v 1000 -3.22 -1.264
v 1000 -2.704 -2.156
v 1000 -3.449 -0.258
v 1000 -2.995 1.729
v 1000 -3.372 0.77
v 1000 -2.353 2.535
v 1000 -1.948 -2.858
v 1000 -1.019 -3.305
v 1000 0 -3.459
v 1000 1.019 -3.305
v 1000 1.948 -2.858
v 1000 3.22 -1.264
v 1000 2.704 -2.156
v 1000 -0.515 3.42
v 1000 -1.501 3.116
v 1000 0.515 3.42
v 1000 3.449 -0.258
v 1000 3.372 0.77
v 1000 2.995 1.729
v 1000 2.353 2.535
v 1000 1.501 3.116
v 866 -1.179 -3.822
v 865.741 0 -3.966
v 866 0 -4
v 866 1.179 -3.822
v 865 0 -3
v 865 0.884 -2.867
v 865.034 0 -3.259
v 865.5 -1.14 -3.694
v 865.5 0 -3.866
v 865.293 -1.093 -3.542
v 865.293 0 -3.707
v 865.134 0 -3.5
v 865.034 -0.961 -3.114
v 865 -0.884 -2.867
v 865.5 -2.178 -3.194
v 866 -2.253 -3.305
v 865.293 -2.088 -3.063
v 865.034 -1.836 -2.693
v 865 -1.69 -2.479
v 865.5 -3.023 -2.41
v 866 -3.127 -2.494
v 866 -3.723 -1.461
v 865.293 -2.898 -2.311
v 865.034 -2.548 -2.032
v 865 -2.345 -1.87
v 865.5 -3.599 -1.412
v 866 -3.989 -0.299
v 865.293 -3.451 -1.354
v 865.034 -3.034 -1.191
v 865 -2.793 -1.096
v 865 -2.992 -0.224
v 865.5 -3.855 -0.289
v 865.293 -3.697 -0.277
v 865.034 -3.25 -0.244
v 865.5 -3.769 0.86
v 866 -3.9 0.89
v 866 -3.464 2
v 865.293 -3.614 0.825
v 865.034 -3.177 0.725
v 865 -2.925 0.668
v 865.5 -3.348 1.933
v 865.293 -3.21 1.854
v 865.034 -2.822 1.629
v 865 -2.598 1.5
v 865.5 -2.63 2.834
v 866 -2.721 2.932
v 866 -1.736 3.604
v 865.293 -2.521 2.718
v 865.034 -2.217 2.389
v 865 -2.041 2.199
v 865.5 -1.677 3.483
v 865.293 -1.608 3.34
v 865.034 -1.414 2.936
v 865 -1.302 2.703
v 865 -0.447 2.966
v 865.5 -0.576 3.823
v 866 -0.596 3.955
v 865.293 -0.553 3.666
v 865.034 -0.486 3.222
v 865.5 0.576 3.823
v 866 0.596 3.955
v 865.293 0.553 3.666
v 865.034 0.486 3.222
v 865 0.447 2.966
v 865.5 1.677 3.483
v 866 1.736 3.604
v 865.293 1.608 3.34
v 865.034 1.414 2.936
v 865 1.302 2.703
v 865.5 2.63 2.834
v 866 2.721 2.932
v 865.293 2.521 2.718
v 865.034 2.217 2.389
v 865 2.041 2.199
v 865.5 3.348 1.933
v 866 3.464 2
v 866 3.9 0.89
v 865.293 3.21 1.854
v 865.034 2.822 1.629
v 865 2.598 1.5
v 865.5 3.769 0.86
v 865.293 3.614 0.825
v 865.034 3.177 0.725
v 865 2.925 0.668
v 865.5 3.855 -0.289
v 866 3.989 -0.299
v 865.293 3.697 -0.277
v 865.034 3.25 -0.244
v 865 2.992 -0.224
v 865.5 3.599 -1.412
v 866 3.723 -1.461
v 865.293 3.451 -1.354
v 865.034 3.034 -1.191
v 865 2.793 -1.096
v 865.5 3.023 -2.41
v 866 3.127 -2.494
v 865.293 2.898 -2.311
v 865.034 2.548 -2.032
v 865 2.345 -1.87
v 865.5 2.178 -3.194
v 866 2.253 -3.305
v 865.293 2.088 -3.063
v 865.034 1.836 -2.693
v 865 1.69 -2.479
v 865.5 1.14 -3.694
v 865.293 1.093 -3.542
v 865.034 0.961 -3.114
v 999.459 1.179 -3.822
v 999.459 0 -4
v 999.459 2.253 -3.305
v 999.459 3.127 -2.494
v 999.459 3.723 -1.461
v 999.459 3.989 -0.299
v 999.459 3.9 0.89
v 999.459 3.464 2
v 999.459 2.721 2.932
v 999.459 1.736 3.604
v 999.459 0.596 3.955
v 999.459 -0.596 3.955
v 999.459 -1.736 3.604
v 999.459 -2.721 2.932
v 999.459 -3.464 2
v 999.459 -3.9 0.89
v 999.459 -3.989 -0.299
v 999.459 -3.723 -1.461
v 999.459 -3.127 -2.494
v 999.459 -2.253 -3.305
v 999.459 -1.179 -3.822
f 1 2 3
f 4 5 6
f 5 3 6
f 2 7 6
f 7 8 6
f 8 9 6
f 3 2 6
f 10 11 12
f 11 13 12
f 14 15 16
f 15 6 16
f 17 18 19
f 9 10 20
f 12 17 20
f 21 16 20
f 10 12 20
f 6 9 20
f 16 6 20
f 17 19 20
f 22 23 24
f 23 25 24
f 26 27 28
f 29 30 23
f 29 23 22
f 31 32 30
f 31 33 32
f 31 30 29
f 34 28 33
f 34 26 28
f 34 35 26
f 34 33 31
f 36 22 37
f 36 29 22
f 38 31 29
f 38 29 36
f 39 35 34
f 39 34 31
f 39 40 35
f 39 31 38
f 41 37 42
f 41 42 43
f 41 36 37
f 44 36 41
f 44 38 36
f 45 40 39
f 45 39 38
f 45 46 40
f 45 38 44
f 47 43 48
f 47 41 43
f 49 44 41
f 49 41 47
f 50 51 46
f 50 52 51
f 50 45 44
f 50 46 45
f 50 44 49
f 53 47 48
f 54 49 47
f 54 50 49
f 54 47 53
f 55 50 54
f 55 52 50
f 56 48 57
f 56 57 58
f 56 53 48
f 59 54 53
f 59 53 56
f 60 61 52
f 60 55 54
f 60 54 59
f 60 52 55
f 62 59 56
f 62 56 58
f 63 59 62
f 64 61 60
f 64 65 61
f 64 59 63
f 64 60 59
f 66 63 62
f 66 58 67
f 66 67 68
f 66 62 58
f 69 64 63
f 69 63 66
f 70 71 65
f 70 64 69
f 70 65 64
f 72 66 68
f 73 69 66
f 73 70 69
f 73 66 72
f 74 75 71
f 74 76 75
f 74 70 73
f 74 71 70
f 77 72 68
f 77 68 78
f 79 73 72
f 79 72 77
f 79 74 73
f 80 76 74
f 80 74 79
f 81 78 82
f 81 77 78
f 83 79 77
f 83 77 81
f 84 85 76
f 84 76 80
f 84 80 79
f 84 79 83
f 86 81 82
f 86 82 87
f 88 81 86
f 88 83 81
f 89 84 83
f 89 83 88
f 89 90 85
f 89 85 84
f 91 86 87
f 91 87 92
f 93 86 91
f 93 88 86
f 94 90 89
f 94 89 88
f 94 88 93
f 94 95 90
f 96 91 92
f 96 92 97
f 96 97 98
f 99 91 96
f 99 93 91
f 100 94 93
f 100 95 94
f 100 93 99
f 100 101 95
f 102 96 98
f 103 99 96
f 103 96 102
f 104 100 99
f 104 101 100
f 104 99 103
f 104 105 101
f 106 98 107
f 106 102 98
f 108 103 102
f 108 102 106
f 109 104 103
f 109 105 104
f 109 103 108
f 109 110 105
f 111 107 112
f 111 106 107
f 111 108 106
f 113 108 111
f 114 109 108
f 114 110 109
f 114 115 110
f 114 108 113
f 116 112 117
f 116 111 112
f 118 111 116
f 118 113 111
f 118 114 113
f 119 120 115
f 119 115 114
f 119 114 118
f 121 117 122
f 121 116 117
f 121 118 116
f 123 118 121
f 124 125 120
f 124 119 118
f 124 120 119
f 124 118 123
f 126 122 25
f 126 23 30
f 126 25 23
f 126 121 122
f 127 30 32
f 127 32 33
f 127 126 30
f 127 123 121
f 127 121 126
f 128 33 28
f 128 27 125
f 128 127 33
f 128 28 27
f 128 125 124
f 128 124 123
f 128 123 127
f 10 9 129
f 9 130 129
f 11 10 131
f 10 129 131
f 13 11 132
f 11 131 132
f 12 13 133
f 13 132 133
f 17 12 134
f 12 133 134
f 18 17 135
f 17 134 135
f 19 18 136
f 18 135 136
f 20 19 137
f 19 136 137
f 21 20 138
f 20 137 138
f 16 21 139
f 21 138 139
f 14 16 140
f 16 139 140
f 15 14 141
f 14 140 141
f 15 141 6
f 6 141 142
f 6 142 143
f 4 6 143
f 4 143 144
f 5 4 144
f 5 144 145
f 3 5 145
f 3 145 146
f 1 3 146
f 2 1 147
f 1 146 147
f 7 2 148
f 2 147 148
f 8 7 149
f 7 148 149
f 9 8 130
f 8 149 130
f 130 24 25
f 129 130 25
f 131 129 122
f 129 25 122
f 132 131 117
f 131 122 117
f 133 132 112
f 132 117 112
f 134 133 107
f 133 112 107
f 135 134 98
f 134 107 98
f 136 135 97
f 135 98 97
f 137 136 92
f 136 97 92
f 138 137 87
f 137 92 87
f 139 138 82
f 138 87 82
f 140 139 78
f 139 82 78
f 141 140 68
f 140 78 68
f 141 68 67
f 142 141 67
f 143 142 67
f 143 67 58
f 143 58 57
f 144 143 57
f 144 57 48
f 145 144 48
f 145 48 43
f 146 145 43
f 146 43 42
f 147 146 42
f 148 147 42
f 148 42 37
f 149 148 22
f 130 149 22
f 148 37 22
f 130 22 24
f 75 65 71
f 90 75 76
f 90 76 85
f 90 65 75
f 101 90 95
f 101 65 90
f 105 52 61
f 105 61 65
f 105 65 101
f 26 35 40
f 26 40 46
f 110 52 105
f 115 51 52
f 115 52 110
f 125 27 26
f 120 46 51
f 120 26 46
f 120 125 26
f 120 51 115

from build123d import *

# Parameters (mm, degrees)
SCHNITT_LINEAR_AUSTRAGEN1_DEPTH      = 1001.015999872
SCHNITT_LINEAR_AUSTRAGEN1_DEPTH_BACK = 1001.015999872
SKIZZE2_W                            = 870
SKIZZE2_H                            = 18
VERRUNDUNG1_R                        = 1


with BuildPart() as part:
    # Skizze1 → Rotation1 (revolve)
    with BuildSketch(Plane.XY, mode=Mode.PRIVATE) as rotation1_sk:
        Polygon((0, 3.45875), (0, 0), (1000, 0), (1000, 3.45875), (999.45875, 4), (0.54125, 4), align=None)
    revolve(rotation1_sk.sketch.rotate(Axis((0, 0, 0), (1, 0, 0)), 270), axis=Axis((0, 0, 0), (1, 0, 0)))

    # Skizze2 → Schnitt-Linear austragen1 (cut, two sides: drawn at the far end of the back side and taken through both)
    with BuildSketch(Plane.XY.offset(-SCHNITT_LINEAR_AUSTRAGEN1_DEPTH_BACK)):
        with Locations((430, 0)):
            Rectangle(SKIZZE2_W, SKIZZE2_H)
    extrude(amount=SCHNITT_LINEAR_AUSTRAGEN1_DEPTH + SCHNITT_LINEAR_AUSTRAGEN1_DEPTH_BACK, mode=Mode.SUBTRACT)

    # Verrundung1
    verrundung1_edges = [part.edges().sort_by_distance(p)[0] for p in [
        (865, 0, 4),
    ]]
    fillet(verrundung1_edges, radius=VERRUNDUNG1_R)


solid = part.part
